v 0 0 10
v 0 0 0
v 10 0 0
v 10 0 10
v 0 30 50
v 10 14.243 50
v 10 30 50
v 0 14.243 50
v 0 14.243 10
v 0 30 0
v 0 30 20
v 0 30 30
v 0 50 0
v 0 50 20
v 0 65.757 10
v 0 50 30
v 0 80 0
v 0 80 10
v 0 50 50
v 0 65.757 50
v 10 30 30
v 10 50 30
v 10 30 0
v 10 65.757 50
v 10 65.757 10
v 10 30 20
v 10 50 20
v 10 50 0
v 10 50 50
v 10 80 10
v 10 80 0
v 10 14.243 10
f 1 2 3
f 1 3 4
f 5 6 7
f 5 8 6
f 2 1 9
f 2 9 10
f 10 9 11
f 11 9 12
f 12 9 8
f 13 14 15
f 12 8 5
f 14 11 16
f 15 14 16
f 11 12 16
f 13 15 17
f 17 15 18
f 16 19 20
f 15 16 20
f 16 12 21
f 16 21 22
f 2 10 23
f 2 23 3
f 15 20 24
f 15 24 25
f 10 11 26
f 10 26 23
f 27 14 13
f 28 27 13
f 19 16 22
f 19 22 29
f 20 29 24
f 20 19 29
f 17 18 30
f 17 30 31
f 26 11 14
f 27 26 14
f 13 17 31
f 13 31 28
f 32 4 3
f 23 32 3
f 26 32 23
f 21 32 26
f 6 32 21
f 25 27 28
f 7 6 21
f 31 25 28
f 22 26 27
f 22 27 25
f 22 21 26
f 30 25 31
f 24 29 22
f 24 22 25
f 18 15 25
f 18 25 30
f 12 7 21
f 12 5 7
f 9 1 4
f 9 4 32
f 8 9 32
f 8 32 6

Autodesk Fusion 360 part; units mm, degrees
sketch "Sketch1" plane through (0, 0, 0) normal (1, 0, 0) x (0, 1, 0)
  line L0 (0, -5.7569) -> (0, 10)
  line L1 (0, 10) -> (14.2431, 10)
  line L2 (14.2431, 10) -> (14.2431, 50)
  line L3 (14.2431, 50) -> (30, 50)
  line L4 (30, 30) -> (50, 30)
  line L5 (50, 30) -> (50, 50)
  line L6 (50, 50) -> (65.7569, 50)
  line L7 (25, -25) -> (23.7742, -25.0601)
  line L8 (65.7569, 50) -> (65.7569, 10)
  line L9 (65.7569, 10) -> (80, 10)
  line L10 (80, 10) -> (80, 0)
  line L11 (0, -5.7569) -> (0, 0)
  line L12 (30, 50) -> (30, 30)
  line L13 (30, 20) -> (50, 20)
  line L14 (50, 20) -> (50, 0)
  line L15 (30, 20) -> (30, 0)
  line L16 (80, 0) -> (50, 0)
  line L17 (30, 0) -> (0, 0)
  dimension "d1" = 10
  dimension "d2" = 80
  dimension "d3" = 20
  dimension "d4" = 15.7569
  dimension "d5" = 50
  dimension "d6" = 10
  dimension "d7" = 30
extrude "Extrude1" add sketch "Sketch1" along normal blind 10
